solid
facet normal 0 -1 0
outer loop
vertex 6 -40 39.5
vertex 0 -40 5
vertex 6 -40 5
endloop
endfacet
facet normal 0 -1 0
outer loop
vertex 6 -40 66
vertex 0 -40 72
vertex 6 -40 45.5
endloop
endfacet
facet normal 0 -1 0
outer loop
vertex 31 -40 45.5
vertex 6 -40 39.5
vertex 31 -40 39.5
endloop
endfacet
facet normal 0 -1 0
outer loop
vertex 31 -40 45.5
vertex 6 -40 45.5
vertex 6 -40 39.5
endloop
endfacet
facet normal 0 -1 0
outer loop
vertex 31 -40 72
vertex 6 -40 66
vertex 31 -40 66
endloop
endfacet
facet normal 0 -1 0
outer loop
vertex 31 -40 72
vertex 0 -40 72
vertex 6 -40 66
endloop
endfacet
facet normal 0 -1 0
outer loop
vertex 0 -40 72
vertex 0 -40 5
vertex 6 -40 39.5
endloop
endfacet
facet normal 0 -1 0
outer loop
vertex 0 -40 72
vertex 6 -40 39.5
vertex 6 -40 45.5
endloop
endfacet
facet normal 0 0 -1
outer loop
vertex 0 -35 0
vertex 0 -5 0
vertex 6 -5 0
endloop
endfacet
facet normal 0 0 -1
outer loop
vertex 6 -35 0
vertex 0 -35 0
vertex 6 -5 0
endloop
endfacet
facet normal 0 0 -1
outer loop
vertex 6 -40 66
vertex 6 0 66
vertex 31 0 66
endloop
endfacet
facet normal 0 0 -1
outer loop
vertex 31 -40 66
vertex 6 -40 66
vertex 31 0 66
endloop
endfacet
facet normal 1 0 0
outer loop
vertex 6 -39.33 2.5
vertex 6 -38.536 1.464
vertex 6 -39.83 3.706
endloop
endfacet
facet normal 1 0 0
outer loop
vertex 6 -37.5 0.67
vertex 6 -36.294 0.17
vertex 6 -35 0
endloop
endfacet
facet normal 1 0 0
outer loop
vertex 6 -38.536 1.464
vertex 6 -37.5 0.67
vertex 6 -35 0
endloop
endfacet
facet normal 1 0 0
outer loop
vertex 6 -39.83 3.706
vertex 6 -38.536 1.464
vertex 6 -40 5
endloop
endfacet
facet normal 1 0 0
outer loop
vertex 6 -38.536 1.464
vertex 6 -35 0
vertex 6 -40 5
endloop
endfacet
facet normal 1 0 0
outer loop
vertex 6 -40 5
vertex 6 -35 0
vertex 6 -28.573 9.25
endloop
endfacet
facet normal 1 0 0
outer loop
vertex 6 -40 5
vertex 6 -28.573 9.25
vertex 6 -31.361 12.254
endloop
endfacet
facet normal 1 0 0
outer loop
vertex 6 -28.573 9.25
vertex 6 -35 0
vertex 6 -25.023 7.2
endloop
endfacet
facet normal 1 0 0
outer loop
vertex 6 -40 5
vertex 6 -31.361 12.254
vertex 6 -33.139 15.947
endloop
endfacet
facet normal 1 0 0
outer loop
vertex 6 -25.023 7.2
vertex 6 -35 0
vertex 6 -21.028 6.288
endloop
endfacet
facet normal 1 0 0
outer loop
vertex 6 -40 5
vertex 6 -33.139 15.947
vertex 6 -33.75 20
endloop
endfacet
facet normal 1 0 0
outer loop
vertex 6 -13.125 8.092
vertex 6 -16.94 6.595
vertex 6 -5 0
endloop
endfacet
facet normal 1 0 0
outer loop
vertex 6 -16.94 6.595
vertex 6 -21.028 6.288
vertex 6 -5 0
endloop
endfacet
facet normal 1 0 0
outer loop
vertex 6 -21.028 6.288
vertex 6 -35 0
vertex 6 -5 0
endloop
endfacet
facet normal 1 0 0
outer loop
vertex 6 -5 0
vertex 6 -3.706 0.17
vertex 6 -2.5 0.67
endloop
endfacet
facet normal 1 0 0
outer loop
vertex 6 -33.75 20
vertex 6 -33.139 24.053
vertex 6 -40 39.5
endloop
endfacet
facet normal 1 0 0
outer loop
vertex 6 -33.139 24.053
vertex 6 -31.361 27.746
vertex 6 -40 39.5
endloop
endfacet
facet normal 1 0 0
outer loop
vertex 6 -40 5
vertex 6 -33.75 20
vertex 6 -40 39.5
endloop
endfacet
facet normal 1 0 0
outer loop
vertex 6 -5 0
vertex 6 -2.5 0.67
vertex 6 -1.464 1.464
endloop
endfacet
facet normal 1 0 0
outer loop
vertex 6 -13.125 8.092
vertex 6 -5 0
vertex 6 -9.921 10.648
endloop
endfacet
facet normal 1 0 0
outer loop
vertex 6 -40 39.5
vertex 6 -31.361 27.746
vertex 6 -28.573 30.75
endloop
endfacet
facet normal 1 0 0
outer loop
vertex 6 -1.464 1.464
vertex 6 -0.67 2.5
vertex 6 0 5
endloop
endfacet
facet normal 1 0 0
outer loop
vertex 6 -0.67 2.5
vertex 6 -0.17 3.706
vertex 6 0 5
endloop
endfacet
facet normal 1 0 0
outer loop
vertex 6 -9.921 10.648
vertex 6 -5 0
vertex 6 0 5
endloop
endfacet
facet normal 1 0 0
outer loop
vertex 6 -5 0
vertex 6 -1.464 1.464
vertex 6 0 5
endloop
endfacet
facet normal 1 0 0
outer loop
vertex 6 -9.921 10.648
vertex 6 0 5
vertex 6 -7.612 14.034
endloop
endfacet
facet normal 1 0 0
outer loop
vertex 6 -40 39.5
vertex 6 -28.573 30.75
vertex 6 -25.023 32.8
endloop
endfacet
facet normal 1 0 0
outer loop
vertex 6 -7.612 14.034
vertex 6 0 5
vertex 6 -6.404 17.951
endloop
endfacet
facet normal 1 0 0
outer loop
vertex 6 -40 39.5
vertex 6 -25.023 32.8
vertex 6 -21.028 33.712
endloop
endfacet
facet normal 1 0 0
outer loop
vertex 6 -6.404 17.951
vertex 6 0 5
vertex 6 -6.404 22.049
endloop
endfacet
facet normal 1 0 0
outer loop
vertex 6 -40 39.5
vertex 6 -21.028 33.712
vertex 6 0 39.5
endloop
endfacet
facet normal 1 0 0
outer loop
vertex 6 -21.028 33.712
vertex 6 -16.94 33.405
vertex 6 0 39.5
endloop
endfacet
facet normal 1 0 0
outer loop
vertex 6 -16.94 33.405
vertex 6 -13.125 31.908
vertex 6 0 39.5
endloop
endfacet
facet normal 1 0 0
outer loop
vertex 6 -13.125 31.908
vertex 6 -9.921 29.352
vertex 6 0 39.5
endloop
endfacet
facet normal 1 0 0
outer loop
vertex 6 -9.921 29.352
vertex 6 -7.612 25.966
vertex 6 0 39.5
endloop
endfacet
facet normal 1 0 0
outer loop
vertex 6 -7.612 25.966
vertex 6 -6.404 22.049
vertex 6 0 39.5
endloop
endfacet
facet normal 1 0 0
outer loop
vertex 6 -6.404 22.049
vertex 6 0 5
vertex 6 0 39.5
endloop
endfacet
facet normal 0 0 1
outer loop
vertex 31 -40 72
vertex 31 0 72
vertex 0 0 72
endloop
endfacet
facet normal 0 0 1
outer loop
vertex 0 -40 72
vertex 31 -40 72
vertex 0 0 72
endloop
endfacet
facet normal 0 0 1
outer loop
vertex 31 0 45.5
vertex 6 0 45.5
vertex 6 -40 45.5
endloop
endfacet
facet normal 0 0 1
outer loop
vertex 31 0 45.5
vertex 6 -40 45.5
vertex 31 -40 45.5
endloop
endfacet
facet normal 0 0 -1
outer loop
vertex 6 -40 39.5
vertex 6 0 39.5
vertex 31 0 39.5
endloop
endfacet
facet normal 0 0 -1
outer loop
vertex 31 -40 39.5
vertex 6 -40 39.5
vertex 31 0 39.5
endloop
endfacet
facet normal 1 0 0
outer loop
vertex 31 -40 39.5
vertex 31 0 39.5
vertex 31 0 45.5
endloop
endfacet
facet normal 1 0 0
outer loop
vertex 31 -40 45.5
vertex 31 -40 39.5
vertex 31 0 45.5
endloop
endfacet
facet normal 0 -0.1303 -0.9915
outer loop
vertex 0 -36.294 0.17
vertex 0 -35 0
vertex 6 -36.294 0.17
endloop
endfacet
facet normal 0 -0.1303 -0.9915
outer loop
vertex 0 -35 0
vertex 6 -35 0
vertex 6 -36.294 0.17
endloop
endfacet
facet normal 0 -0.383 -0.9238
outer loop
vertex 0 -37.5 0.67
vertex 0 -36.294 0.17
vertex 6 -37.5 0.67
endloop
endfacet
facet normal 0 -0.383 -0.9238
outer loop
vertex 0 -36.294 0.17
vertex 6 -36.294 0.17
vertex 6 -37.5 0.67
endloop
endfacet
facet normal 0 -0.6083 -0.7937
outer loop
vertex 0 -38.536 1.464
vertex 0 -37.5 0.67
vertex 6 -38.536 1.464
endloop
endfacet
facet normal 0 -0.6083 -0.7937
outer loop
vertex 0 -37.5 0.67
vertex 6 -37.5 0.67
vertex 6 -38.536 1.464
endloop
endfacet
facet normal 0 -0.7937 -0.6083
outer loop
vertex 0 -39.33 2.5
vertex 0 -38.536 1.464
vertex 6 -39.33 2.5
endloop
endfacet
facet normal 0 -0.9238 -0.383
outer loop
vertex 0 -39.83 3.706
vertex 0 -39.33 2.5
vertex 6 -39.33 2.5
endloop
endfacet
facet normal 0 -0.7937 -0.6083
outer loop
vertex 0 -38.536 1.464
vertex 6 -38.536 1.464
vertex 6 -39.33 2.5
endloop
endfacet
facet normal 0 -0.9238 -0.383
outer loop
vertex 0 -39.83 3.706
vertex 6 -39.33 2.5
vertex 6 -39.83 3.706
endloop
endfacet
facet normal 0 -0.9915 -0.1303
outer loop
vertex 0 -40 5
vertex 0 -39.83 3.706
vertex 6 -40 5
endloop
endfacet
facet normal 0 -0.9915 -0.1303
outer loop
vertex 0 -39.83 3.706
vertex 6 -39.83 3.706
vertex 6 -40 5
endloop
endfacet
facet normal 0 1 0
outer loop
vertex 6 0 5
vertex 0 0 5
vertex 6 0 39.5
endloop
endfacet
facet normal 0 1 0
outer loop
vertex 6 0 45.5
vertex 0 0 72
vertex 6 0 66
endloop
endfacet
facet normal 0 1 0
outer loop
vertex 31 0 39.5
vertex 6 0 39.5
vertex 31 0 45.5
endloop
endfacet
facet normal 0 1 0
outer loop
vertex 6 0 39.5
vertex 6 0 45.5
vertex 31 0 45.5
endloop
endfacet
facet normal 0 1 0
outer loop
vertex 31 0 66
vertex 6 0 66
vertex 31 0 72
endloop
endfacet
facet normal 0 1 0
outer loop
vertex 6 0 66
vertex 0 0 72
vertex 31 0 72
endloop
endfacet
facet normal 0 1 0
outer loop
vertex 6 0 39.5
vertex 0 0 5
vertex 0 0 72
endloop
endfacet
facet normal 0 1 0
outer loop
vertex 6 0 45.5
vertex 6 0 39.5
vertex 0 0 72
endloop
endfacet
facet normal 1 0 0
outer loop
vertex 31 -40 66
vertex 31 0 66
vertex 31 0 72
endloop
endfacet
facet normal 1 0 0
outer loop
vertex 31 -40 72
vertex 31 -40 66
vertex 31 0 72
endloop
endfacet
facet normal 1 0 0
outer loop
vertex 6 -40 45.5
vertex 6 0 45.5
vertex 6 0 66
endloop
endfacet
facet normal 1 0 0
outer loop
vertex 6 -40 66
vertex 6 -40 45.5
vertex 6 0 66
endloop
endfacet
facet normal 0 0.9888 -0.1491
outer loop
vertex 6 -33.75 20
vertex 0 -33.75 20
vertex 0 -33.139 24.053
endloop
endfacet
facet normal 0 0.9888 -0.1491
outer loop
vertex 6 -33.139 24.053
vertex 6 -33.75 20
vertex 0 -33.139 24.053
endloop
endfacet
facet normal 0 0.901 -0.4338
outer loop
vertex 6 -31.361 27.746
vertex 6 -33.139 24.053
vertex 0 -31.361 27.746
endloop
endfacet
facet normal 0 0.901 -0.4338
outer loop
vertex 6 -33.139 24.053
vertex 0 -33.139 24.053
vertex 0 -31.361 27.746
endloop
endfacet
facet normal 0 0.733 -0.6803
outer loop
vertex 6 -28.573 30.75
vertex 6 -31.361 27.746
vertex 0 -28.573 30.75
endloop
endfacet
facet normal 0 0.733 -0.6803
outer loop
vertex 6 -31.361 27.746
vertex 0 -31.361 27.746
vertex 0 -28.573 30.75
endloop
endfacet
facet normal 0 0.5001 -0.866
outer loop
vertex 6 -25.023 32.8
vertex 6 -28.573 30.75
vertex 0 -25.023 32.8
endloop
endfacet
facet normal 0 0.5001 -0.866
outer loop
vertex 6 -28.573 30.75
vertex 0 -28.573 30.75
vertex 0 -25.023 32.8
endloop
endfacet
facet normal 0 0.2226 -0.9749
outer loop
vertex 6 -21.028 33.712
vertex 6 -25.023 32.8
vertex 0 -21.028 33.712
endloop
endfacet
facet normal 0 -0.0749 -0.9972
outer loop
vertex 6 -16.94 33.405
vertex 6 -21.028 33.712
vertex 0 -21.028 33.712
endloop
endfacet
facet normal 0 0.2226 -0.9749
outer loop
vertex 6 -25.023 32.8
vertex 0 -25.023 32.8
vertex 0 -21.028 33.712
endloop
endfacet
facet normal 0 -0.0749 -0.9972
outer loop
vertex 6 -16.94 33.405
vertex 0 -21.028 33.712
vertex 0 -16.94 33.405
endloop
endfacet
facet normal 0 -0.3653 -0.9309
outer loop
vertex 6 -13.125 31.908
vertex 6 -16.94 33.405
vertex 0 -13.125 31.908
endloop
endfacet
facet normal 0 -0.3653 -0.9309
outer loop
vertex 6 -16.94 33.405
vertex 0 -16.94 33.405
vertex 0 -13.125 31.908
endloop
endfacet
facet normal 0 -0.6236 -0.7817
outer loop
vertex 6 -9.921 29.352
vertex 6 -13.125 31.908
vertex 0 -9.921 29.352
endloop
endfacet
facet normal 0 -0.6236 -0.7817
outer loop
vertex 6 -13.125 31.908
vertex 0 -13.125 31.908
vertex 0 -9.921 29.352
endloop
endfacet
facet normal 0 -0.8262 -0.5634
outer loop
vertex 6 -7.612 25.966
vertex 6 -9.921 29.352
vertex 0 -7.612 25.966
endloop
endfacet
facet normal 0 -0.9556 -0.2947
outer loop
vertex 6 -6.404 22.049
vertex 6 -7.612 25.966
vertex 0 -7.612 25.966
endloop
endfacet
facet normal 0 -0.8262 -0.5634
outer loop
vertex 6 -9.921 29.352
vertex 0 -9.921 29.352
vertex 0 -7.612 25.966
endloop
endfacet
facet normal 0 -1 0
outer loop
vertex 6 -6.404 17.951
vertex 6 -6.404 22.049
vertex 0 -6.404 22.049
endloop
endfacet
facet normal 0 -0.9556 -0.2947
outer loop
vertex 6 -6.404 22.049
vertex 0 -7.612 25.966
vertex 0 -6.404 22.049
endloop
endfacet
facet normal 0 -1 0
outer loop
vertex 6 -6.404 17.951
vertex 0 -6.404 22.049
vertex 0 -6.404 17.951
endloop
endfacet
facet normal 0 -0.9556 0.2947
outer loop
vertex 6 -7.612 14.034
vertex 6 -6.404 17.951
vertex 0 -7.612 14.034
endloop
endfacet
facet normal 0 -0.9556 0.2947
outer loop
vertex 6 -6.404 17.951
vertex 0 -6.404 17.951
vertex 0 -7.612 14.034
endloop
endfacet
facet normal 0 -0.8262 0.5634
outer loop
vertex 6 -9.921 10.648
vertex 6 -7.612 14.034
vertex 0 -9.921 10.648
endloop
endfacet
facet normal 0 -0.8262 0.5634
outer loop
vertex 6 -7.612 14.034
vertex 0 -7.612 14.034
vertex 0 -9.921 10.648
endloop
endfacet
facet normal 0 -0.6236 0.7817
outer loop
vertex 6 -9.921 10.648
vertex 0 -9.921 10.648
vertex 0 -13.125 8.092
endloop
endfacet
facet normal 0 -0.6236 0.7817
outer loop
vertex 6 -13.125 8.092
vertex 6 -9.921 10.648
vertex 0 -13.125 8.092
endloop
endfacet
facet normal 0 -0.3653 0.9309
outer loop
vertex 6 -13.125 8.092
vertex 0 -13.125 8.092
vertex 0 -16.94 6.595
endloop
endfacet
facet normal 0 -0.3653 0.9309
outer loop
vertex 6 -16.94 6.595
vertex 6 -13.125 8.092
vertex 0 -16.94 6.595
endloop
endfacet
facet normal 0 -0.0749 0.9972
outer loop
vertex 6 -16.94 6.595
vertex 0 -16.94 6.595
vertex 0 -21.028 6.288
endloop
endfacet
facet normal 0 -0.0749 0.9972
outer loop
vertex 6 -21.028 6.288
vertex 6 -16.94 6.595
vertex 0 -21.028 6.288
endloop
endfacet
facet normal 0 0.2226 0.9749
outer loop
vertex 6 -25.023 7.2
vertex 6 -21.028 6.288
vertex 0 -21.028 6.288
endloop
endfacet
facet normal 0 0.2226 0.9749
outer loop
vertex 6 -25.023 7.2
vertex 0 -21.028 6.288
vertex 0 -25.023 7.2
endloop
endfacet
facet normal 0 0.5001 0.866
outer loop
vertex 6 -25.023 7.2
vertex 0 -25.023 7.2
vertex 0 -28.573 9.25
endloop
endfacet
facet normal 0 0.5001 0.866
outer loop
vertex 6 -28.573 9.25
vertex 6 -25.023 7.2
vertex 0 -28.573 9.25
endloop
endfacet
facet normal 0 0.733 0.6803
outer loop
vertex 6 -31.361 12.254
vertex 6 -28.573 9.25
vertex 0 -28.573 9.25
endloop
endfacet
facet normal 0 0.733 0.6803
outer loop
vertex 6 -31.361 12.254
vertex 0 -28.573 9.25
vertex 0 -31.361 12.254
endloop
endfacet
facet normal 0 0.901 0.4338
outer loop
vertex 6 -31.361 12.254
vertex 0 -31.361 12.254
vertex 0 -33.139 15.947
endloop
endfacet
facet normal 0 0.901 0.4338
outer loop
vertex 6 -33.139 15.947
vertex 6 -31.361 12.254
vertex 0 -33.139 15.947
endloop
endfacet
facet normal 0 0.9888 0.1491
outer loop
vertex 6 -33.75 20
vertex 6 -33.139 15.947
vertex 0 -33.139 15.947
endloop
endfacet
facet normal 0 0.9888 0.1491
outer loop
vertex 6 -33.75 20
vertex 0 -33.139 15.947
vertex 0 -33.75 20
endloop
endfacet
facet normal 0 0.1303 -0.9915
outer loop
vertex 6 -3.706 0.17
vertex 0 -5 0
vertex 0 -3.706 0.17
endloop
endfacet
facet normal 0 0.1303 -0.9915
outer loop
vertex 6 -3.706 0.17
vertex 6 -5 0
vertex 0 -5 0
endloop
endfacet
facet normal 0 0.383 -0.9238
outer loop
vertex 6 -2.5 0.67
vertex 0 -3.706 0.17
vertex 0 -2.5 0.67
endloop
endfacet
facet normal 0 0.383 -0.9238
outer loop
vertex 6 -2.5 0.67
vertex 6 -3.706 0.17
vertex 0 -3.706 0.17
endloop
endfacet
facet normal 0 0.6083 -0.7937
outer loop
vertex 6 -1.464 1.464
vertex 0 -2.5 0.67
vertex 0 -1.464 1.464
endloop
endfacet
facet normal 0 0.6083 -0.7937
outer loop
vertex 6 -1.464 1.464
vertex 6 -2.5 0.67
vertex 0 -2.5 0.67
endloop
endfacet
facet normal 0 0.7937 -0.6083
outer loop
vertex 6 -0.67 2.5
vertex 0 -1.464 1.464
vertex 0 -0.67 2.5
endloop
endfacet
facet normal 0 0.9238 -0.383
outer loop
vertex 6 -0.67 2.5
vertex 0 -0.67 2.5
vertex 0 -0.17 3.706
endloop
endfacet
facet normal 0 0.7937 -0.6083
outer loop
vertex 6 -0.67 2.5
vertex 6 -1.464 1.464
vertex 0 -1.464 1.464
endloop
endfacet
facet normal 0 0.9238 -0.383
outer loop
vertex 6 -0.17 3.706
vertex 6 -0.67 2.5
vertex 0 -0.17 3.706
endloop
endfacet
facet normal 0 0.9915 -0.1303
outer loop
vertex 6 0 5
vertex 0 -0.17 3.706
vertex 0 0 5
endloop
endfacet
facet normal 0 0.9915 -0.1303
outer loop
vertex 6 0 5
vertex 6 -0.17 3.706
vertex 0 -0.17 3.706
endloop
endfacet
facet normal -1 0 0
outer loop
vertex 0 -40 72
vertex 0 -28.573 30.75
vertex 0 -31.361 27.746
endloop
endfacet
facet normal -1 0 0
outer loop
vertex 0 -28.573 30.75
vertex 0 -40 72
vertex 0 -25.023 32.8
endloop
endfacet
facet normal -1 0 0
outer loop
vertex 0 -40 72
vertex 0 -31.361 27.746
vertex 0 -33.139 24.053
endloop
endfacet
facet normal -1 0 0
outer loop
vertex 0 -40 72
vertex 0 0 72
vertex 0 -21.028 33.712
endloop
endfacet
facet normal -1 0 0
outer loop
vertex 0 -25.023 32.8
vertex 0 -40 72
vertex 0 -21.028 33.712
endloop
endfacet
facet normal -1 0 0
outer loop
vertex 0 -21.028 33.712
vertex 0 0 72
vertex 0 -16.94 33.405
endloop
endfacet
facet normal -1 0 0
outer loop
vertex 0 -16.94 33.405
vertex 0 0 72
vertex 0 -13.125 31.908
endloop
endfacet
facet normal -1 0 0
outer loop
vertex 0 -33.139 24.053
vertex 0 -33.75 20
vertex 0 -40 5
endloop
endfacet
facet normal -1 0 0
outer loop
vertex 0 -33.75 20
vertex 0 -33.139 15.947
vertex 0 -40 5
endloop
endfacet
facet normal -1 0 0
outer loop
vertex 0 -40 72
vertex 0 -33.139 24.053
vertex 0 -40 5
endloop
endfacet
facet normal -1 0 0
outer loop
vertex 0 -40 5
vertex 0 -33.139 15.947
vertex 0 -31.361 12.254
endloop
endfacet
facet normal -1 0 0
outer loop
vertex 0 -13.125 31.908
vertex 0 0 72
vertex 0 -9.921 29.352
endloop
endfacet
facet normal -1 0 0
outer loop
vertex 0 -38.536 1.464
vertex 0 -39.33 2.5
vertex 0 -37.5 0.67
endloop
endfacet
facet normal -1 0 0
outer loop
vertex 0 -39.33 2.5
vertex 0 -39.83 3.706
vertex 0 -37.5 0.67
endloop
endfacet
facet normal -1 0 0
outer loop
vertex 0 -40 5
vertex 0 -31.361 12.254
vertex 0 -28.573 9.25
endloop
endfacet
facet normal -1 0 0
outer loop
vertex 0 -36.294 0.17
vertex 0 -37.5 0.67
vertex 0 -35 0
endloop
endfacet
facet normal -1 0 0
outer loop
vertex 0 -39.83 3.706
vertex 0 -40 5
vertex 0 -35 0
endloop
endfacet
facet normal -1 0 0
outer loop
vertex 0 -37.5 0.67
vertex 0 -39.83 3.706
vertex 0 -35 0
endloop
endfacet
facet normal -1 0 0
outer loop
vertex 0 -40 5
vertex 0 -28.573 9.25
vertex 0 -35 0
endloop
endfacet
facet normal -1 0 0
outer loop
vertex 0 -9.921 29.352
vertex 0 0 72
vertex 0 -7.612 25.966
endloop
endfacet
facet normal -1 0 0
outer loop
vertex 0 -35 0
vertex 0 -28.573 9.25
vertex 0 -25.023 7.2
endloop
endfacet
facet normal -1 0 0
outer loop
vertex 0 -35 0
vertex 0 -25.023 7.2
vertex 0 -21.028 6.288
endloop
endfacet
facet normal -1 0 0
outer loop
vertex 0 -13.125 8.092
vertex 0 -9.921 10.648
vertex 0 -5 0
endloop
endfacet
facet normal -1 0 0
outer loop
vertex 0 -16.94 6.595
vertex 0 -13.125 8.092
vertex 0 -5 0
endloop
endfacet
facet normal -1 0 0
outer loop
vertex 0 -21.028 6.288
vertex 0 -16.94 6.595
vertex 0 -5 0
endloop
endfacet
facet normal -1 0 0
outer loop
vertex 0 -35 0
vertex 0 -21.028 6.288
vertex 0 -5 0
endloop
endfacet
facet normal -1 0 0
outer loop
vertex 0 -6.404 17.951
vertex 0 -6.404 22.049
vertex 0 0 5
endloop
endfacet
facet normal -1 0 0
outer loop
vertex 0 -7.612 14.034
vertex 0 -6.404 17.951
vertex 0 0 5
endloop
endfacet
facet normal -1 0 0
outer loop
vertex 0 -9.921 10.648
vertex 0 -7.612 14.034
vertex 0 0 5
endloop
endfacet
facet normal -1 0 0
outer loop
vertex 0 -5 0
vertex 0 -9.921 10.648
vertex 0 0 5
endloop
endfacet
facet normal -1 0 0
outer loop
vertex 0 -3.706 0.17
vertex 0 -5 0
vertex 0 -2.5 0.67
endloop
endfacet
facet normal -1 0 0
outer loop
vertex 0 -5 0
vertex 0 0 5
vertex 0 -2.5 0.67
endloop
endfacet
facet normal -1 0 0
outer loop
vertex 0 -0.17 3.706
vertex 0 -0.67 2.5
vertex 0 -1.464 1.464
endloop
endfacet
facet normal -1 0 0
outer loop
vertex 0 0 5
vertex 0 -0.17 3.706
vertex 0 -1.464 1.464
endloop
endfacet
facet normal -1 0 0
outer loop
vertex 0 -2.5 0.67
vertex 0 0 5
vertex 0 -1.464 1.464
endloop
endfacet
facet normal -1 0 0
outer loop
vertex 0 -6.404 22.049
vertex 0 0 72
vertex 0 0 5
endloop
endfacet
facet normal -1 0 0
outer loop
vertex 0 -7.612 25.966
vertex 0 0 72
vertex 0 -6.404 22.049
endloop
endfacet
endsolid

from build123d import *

# Parameters (mm, degrees)
F0_W     = 25
F0_H     = 6
F1_DEPTH = 40
F2_R     = 5
F3_R     = 13.75
F4_DEPTH = 25


with BuildPart() as f1:
    # F0 (on Front) → F1 (new body)
    with BuildSketch(Plane.XZ):
        Polygon((0, 72), (0, 0), (6, 0), (6, 39.5), (6, 45.5), (6, 66), (6, 72), align=None)
        with Locations((18.5, 42.5)):
            Rectangle(F0_W, F0_H)
        with Locations((18.5, 69)):
            Rectangle(F0_W, F0_H)
    extrude(amount=F1_DEPTH)

    # F2
    f2_edges = [f1.edges().sort_by_distance(p)[0] for p in [
        (3, 0, 0),
        (3, -40, 0),
    ]]
    fillet(f2_edges, radius=F2_R)

    # F3 (on face) → F4 (cut)
    with BuildSketch(Plane(origin=(0, 0, 0), x_dir=(0, -1, 0), z_dir=(-1, 0, 0))):
        with Locations((20, 20)):
            Circle(F3_R)
    extrude(amount=-F4_DEPTH, mode=Mode.SUBTRACT)


solid = f1.part
